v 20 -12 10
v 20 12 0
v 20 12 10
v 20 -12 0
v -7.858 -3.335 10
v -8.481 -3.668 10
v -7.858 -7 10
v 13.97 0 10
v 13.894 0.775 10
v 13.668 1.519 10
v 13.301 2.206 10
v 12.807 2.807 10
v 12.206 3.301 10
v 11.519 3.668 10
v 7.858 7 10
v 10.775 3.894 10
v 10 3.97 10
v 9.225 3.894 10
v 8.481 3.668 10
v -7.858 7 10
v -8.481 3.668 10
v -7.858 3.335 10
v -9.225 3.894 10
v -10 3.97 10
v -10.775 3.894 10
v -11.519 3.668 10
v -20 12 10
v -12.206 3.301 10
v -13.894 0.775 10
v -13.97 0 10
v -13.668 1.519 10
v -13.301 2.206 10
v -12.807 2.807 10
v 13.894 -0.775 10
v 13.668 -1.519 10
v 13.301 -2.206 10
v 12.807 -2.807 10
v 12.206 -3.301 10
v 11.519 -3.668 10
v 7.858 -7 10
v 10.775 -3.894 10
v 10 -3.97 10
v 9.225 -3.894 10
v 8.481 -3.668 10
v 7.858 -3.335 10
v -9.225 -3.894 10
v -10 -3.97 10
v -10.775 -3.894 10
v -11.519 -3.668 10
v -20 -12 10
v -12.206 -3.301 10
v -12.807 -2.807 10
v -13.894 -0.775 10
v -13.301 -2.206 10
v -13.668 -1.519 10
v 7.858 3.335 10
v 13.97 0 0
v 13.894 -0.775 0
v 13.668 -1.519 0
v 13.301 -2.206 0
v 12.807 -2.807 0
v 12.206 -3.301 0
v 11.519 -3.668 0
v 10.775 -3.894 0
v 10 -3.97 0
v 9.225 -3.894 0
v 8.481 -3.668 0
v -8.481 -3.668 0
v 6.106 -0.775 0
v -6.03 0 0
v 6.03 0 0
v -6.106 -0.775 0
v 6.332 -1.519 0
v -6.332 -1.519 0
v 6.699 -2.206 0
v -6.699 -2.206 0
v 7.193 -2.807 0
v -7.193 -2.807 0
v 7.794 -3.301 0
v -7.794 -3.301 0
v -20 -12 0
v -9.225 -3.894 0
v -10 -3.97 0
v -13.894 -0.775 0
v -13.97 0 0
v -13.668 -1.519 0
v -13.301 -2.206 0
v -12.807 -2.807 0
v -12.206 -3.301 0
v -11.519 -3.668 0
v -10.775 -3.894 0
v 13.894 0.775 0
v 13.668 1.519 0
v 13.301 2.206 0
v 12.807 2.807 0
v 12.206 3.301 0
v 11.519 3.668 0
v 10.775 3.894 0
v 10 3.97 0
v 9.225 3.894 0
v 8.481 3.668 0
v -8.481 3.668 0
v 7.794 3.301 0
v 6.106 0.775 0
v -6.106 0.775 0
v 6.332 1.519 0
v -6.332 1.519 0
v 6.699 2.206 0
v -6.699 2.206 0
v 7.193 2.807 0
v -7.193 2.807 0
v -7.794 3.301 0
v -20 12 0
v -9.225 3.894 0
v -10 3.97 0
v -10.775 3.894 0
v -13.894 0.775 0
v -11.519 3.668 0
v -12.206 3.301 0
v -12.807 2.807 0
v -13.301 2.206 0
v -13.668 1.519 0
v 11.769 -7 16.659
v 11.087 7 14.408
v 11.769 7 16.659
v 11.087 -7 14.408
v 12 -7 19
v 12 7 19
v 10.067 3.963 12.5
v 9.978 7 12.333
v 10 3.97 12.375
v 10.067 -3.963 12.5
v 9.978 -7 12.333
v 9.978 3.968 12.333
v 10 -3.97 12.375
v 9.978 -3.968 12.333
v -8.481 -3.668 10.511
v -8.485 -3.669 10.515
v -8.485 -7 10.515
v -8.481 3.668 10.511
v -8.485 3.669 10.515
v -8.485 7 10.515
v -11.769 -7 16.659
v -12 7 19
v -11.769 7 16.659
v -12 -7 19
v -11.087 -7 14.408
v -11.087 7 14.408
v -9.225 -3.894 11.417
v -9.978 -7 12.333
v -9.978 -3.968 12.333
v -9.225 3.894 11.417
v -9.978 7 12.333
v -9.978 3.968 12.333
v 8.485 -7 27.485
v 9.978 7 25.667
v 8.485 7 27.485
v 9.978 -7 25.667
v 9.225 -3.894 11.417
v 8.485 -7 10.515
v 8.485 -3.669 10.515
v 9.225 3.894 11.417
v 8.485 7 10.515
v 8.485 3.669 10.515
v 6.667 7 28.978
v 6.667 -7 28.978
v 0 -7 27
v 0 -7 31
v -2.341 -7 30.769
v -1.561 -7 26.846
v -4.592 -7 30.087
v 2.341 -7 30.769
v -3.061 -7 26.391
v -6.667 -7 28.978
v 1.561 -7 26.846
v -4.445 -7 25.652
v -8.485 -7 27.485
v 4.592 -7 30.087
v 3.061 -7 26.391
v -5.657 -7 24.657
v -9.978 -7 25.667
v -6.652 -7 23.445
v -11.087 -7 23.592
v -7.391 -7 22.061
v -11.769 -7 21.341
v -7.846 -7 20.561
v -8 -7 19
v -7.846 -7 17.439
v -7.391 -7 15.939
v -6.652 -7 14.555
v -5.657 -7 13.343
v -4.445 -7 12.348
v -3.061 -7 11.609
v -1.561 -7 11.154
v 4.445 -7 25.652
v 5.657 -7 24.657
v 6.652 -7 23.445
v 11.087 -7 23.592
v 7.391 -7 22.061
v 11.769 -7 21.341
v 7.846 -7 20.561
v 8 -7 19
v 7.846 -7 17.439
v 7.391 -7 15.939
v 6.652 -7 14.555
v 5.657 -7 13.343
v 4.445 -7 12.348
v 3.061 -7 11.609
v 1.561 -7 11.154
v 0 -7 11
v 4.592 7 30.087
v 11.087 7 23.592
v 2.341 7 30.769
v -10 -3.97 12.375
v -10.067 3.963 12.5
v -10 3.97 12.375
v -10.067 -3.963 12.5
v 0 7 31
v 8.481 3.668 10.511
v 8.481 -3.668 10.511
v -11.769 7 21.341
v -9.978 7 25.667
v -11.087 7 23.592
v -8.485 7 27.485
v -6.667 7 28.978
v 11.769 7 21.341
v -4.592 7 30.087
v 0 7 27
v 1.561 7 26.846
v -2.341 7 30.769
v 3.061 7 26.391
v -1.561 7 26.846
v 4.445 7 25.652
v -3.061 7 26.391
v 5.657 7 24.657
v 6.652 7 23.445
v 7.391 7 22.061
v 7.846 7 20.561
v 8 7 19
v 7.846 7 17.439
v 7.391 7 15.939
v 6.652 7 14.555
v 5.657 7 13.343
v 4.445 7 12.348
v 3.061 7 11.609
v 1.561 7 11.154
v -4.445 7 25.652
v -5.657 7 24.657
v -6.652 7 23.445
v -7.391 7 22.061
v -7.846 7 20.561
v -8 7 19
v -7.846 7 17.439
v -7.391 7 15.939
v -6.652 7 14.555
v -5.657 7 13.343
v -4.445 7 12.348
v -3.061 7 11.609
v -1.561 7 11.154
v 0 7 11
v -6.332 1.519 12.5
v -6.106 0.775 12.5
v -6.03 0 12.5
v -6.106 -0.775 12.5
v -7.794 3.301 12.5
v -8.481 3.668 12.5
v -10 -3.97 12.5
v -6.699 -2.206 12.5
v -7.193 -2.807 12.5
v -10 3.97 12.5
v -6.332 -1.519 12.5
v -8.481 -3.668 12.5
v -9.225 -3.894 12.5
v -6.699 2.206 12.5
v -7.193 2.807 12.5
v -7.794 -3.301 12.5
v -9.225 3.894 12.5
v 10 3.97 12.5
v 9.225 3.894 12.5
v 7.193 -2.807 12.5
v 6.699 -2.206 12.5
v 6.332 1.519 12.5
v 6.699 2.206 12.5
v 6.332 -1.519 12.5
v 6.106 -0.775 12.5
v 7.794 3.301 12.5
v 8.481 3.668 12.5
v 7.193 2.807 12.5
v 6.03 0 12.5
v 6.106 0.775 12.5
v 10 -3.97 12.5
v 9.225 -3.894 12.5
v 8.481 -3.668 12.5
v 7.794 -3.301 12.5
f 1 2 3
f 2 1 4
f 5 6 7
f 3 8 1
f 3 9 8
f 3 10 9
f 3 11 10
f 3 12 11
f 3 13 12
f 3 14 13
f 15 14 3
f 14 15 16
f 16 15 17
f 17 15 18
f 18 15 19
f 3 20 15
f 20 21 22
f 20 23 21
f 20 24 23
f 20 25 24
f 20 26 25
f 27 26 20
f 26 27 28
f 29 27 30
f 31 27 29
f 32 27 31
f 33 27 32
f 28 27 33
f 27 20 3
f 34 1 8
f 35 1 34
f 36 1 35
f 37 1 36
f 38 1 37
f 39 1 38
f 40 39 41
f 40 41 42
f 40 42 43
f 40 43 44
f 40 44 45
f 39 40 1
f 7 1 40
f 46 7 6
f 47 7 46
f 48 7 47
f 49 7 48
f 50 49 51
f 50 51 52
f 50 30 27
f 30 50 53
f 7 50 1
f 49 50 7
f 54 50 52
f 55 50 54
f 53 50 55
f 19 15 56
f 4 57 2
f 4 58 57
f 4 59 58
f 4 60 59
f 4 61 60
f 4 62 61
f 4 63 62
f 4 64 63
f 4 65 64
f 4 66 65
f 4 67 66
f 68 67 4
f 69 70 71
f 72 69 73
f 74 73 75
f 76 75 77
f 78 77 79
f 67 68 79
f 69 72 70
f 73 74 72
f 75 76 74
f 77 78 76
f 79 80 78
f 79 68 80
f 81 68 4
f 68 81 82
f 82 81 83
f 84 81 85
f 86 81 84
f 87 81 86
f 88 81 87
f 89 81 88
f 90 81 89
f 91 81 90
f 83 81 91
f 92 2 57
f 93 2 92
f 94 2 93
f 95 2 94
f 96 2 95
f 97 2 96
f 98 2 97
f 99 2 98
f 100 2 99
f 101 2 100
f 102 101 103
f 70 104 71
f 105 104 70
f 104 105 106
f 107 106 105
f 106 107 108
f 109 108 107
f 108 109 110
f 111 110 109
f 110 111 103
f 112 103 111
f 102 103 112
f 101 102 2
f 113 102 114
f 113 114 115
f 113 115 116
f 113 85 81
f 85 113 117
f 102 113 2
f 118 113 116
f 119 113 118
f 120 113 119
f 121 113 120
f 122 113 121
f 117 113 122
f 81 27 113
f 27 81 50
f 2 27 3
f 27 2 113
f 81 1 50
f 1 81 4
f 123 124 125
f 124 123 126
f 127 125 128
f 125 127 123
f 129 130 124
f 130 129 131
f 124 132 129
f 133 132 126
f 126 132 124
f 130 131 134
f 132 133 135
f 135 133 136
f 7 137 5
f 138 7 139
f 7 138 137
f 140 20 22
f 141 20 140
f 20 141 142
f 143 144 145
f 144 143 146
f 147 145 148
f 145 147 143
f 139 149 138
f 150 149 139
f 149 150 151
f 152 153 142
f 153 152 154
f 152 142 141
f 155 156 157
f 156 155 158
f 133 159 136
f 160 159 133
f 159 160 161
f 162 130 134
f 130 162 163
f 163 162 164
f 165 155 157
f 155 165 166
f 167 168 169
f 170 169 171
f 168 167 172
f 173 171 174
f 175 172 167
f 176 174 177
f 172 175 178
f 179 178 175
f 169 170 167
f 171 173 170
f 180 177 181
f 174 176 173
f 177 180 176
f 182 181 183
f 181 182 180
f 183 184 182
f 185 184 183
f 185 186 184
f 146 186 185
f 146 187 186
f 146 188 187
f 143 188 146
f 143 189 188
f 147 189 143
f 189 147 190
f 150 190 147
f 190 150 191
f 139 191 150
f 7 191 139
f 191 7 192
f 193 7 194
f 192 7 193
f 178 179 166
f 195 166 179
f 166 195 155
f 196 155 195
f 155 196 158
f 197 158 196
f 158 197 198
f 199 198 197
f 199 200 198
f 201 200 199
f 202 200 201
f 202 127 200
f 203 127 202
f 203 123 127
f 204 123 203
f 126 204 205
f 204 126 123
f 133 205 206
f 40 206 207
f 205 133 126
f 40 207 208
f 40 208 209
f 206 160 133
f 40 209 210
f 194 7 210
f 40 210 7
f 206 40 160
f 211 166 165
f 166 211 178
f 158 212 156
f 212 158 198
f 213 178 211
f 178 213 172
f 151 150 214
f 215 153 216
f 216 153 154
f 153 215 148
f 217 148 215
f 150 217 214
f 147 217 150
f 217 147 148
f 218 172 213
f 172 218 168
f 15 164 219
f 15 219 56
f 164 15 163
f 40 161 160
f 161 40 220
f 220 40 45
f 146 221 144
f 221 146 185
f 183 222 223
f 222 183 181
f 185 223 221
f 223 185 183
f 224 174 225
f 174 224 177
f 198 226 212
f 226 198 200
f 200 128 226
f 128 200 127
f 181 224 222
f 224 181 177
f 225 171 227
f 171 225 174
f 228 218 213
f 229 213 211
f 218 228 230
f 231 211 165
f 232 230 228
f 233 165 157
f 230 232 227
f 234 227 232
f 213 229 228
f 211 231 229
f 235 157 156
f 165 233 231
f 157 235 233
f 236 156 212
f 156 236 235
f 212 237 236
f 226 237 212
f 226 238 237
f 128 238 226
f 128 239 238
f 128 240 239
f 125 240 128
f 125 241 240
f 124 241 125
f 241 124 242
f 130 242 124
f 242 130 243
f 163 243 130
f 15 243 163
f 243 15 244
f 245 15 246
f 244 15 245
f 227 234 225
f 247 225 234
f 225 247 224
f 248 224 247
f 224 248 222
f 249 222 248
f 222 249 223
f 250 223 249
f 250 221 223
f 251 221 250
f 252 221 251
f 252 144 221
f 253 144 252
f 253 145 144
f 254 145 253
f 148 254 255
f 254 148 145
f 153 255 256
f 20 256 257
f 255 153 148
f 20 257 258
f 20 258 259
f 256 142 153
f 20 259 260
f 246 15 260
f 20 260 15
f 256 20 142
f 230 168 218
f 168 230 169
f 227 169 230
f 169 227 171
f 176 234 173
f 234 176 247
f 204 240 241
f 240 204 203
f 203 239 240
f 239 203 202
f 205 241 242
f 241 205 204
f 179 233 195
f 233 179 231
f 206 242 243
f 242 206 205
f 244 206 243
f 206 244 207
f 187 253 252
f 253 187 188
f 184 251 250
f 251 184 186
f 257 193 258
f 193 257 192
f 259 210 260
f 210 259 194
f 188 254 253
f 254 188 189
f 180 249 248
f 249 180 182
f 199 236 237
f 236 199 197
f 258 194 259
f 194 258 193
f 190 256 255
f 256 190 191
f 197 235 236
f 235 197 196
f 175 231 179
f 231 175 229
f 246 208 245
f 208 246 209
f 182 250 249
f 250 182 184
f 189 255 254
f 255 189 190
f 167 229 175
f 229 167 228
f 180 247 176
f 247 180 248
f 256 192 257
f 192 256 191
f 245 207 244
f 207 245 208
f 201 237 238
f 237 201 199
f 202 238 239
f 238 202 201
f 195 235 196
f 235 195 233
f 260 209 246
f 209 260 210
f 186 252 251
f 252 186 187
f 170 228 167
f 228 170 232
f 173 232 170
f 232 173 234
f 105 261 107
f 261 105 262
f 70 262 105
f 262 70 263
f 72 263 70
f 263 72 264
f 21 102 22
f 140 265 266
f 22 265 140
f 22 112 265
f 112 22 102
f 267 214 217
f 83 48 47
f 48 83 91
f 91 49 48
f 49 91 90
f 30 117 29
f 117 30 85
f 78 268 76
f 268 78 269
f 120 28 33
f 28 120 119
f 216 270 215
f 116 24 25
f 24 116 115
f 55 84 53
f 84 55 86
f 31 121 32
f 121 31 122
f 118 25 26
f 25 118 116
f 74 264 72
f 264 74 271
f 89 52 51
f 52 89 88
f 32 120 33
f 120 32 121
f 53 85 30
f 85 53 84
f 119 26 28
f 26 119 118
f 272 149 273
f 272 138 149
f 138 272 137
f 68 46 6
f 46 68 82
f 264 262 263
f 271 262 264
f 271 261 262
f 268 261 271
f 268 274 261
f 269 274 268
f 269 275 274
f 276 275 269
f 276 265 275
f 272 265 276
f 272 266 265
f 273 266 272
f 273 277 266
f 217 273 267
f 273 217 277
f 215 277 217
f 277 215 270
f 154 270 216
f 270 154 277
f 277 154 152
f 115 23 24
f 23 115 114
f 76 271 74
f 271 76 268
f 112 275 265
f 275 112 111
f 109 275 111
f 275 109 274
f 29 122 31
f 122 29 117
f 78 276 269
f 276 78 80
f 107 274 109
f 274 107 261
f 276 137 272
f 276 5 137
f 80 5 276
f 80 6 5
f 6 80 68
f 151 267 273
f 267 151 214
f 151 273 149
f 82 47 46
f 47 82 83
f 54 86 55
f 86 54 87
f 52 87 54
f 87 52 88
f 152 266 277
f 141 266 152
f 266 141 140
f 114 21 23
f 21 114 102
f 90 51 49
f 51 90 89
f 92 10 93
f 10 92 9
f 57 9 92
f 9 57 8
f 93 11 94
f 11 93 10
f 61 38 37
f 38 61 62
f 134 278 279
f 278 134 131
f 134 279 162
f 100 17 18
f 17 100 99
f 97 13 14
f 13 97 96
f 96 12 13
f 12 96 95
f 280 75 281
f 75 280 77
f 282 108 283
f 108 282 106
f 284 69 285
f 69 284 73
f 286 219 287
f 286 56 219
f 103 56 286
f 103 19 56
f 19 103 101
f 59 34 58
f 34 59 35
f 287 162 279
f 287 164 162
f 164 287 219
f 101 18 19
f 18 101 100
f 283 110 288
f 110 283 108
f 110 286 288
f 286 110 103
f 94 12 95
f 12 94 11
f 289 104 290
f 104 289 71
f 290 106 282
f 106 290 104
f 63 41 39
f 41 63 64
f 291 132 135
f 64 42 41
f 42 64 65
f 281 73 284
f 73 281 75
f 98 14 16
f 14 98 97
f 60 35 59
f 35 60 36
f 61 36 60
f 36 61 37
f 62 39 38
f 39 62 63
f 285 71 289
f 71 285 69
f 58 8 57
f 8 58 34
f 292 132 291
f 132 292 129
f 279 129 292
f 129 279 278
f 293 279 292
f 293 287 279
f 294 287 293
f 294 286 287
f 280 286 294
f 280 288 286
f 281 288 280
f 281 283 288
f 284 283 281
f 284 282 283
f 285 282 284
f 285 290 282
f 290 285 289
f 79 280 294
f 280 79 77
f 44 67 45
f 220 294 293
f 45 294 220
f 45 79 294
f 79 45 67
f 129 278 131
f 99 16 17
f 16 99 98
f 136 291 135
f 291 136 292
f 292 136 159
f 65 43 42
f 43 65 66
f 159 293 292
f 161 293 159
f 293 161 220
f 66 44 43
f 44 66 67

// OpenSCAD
$fn = 32;

// ----------------------------------------------------------------------
// Deck eye: 24 mm eye on a 40 mm base
// ----------------------------------------------------------------------

// --- parameters (mm) ---
base_l = 40;              // base length
base_w = 24;              // base width
base_t = 10;              // base thickness
eye_r = 12;               // eye outside radius
eye_bore = 16;            // eye bore diameter
eye_w = 14;               // eye thickness
eye_z = 19;               // eye centre height
holes_d = 7.94;           // fixing holes
hole_x = 10;              // fixing hole spacing

difference() {
  union() {
    translate([-20, -12, 0]) cube([base_l, base_w, base_t]);
    /* eye standing upright, its foot sunk 3 mm into the base */
    translate([0, -7, 19]) rotate([-90, 0, 0]) cylinder(h = 14, d = 24);
  }
  /* eye bore, 2.5 mm clear of both faces */
  translate([0, -9.5, 19]) rotate([-90, 0, 0]) cylinder(h = 19, d = 16);
  translate([-10, 0, -2.5]) cylinder(h = base_t + 5, d = holes_d);
  translate([10, 0, -2.5]) cylinder(h = base_t + 5, d = holes_d);
}
